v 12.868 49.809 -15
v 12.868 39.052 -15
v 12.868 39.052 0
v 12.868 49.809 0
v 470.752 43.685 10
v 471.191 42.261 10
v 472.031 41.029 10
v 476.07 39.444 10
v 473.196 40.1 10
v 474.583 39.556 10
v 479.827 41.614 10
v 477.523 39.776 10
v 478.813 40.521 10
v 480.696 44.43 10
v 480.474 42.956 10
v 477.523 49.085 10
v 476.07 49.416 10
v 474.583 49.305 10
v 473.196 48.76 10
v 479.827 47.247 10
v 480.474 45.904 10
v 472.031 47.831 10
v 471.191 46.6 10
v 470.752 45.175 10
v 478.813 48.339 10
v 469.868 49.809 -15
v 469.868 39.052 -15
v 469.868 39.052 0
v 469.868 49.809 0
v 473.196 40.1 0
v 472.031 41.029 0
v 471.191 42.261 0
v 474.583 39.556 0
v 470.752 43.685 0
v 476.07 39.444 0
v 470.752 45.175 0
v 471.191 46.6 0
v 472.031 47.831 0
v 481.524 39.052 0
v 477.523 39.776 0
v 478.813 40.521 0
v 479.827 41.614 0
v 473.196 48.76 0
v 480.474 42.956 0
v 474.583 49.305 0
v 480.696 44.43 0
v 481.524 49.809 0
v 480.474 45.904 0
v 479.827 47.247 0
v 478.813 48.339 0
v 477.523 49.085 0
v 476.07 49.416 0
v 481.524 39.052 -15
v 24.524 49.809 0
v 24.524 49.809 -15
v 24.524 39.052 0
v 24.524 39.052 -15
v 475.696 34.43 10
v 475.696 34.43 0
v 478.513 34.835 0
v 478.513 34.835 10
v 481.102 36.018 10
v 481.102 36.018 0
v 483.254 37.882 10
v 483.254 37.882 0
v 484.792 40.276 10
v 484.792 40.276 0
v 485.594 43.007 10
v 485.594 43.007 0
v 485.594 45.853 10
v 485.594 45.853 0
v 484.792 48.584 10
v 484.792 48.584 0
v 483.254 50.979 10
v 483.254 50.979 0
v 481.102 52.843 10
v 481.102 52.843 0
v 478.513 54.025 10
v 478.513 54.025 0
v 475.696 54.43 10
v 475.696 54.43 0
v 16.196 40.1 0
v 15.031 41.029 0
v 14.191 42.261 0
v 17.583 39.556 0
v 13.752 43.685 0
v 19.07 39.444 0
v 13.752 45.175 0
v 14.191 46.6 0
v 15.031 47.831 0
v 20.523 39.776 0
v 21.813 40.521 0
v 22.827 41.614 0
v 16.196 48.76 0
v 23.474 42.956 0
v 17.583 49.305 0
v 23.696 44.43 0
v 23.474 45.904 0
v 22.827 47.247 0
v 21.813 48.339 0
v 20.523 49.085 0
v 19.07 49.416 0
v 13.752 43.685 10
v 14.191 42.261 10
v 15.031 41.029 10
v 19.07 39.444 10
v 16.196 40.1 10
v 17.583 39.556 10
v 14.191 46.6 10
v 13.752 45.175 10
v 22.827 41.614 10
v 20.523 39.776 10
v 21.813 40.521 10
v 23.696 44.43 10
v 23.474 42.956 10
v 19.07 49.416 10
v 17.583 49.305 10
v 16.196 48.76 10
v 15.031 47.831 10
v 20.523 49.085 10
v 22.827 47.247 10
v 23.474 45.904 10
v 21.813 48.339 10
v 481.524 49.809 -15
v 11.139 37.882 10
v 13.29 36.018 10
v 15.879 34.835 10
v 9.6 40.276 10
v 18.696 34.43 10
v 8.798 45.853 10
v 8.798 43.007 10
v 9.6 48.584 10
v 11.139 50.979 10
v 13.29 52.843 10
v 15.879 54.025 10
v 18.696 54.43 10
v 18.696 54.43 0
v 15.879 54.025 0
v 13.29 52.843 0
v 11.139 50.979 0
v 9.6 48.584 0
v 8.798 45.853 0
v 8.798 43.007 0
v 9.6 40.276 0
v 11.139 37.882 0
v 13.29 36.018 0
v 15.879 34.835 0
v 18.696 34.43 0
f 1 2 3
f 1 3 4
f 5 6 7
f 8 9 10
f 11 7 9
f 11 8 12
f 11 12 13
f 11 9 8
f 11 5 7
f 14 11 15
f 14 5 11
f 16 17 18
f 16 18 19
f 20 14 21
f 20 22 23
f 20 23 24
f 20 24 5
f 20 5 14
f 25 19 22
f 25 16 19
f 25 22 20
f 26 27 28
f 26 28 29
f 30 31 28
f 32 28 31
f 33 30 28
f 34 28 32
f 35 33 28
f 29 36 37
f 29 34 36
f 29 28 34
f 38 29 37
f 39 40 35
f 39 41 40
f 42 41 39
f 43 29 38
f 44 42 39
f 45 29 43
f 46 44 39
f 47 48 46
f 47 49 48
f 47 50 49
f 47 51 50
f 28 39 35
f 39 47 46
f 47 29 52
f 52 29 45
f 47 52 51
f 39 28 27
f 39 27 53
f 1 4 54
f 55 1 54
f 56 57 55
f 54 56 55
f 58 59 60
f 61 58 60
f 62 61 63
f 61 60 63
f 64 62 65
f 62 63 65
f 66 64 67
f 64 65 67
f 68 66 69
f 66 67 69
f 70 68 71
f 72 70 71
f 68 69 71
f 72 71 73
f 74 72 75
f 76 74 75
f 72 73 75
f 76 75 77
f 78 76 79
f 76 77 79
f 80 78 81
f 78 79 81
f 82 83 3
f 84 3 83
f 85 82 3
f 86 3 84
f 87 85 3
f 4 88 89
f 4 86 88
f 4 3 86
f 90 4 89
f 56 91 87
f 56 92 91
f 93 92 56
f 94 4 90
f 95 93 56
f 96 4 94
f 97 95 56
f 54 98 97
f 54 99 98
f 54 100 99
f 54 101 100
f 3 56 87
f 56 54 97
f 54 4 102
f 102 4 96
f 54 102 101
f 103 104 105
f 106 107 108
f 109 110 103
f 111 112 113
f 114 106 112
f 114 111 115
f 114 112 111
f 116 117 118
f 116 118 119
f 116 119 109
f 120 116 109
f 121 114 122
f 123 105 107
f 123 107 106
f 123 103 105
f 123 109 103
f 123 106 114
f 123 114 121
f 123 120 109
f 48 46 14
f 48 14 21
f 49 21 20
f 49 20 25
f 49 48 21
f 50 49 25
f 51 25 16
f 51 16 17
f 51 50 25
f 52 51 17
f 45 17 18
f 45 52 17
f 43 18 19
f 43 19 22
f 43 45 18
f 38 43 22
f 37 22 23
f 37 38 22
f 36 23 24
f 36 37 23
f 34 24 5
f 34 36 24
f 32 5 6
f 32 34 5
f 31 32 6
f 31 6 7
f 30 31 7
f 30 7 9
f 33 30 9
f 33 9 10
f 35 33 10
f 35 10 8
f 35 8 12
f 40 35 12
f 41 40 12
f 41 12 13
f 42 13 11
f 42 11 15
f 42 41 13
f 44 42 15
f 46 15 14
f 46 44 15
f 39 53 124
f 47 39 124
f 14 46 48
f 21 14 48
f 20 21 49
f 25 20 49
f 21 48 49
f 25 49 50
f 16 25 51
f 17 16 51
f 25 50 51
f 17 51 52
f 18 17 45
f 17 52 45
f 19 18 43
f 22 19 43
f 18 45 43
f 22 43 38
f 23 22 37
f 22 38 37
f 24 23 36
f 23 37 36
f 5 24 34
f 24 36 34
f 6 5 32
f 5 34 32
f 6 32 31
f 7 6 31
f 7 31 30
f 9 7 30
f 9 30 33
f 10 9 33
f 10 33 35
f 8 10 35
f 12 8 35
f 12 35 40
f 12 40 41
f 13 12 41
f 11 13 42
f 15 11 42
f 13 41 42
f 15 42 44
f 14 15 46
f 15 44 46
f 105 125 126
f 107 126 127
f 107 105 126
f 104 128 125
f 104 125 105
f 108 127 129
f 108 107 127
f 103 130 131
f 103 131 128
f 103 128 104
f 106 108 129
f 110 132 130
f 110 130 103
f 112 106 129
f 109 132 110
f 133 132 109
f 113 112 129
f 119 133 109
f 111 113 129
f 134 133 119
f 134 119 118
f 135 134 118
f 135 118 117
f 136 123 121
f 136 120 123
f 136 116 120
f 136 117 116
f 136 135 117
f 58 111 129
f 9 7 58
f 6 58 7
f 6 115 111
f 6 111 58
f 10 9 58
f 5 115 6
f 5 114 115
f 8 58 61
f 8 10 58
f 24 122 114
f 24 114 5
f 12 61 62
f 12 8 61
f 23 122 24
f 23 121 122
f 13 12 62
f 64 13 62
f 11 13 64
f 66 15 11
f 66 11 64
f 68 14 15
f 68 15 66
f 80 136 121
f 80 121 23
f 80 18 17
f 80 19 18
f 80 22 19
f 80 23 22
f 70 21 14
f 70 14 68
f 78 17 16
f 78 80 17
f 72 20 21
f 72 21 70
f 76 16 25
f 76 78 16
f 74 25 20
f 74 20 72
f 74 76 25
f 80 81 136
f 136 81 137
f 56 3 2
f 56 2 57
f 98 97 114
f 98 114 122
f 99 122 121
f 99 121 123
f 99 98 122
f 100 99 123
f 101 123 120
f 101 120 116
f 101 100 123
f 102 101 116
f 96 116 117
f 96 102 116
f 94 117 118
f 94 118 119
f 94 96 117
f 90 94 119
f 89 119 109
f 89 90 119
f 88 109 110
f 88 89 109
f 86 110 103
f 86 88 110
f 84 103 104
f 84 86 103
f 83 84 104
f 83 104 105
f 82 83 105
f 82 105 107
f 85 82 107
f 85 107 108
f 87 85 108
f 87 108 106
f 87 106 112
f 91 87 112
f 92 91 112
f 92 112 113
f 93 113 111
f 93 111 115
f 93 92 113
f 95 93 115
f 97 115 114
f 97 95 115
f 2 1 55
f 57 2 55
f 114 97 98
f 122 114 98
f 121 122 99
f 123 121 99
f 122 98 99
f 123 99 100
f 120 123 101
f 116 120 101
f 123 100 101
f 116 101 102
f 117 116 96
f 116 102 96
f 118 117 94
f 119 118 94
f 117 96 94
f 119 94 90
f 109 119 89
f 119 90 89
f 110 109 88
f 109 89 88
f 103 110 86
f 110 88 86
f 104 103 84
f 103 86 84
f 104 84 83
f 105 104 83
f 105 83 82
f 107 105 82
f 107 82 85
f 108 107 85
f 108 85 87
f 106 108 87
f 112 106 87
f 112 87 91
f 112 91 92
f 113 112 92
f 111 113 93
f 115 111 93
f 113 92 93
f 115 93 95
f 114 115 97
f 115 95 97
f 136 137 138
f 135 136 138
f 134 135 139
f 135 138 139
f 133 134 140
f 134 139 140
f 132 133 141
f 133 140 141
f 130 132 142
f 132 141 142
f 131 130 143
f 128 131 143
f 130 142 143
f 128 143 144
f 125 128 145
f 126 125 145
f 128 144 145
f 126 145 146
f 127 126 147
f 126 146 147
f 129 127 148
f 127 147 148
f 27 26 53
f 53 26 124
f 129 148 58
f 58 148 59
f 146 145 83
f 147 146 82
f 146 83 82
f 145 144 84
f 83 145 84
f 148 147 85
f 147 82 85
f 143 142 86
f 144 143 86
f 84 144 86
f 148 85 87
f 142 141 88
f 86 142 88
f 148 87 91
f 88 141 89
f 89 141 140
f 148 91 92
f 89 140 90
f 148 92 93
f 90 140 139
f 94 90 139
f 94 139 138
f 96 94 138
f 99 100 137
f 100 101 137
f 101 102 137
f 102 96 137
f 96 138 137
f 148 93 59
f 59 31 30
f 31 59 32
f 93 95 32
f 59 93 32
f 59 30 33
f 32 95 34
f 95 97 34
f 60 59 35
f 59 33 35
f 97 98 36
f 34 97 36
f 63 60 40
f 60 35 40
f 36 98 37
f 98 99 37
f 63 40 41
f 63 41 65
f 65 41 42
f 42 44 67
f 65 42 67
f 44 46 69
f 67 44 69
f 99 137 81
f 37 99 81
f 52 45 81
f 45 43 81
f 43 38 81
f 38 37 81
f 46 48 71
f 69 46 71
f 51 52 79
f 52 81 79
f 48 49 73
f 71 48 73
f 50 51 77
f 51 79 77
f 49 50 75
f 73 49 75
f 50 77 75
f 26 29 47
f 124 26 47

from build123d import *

# Parameters (mm, degrees)
F0_R     = 5
F1_DEPTH = 10
F2_W     = 11.6554063559
F2_H     = 10.7572656125
F3_DEPTH = 15
F4_DEPTH = 10


with BuildPart() as f1:
    # F0 (on Top) → F1 (new body)
    with BuildSketch(Plane.XY):
        with BuildLine():
            Line((475.696013391, 54.4301785901), (18.696013391, 54.4301785901))
            ThreePointArc((18.696013391, 54.4301785901), (8.696013391, 44.4301785901), (18.696013391, 34.4301785901))
            Line((18.696013391, 34.4301785901), (475.696013391, 34.4301785901))
            ThreePointArc((475.696013391, 34.4301785901), (485.696013391, 44.4301785901), (475.696013391, 54.4301785901))
        make_face()
        with Locations((18.696013391, 44.4301785901)):
            Circle(F0_R, mode=Mode.SUBTRACT)
        with Locations((475.696013391, 44.4301785901)):
            Circle(F0_R, mode=Mode.SUBTRACT)
    extrude(amount=F1_DEPTH)


with BuildPart() as f3:
    # F2 (on Top) → F3 (new body)
    with BuildSketch(Plane.XY):
        with Locations((18.696013391, 44.4301785901)):
            Rectangle(F2_W, F2_H)
    extrude(amount=-F3_DEPTH)

    # F0 (on Top) → F4 (join)
    with BuildSketch(Plane.XY):
        with Locations((18.696013391, 44.4301785901)):
            Circle(F0_R)
    extrude(amount=F4_DEPTH)


with BuildPart() as f3b:
    # F2 (on Top) → F3, piece 2 (new body)
    with BuildSketch(Plane.XY):
        with Locations((475.696013391, 44.4301785901)):
            Rectangle(F2_W, F2_H)
    extrude(amount=-F3_DEPTH)

    # F0 (on Top) → F4, piece 2 (join)
    with BuildSketch(Plane.XY):
        with Locations((475.696013391, 44.4301785901)):
            Circle(F0_R)
    extrude(amount=F4_DEPTH)


solid = Compound([f1.part, f3.part, f3b.part])
